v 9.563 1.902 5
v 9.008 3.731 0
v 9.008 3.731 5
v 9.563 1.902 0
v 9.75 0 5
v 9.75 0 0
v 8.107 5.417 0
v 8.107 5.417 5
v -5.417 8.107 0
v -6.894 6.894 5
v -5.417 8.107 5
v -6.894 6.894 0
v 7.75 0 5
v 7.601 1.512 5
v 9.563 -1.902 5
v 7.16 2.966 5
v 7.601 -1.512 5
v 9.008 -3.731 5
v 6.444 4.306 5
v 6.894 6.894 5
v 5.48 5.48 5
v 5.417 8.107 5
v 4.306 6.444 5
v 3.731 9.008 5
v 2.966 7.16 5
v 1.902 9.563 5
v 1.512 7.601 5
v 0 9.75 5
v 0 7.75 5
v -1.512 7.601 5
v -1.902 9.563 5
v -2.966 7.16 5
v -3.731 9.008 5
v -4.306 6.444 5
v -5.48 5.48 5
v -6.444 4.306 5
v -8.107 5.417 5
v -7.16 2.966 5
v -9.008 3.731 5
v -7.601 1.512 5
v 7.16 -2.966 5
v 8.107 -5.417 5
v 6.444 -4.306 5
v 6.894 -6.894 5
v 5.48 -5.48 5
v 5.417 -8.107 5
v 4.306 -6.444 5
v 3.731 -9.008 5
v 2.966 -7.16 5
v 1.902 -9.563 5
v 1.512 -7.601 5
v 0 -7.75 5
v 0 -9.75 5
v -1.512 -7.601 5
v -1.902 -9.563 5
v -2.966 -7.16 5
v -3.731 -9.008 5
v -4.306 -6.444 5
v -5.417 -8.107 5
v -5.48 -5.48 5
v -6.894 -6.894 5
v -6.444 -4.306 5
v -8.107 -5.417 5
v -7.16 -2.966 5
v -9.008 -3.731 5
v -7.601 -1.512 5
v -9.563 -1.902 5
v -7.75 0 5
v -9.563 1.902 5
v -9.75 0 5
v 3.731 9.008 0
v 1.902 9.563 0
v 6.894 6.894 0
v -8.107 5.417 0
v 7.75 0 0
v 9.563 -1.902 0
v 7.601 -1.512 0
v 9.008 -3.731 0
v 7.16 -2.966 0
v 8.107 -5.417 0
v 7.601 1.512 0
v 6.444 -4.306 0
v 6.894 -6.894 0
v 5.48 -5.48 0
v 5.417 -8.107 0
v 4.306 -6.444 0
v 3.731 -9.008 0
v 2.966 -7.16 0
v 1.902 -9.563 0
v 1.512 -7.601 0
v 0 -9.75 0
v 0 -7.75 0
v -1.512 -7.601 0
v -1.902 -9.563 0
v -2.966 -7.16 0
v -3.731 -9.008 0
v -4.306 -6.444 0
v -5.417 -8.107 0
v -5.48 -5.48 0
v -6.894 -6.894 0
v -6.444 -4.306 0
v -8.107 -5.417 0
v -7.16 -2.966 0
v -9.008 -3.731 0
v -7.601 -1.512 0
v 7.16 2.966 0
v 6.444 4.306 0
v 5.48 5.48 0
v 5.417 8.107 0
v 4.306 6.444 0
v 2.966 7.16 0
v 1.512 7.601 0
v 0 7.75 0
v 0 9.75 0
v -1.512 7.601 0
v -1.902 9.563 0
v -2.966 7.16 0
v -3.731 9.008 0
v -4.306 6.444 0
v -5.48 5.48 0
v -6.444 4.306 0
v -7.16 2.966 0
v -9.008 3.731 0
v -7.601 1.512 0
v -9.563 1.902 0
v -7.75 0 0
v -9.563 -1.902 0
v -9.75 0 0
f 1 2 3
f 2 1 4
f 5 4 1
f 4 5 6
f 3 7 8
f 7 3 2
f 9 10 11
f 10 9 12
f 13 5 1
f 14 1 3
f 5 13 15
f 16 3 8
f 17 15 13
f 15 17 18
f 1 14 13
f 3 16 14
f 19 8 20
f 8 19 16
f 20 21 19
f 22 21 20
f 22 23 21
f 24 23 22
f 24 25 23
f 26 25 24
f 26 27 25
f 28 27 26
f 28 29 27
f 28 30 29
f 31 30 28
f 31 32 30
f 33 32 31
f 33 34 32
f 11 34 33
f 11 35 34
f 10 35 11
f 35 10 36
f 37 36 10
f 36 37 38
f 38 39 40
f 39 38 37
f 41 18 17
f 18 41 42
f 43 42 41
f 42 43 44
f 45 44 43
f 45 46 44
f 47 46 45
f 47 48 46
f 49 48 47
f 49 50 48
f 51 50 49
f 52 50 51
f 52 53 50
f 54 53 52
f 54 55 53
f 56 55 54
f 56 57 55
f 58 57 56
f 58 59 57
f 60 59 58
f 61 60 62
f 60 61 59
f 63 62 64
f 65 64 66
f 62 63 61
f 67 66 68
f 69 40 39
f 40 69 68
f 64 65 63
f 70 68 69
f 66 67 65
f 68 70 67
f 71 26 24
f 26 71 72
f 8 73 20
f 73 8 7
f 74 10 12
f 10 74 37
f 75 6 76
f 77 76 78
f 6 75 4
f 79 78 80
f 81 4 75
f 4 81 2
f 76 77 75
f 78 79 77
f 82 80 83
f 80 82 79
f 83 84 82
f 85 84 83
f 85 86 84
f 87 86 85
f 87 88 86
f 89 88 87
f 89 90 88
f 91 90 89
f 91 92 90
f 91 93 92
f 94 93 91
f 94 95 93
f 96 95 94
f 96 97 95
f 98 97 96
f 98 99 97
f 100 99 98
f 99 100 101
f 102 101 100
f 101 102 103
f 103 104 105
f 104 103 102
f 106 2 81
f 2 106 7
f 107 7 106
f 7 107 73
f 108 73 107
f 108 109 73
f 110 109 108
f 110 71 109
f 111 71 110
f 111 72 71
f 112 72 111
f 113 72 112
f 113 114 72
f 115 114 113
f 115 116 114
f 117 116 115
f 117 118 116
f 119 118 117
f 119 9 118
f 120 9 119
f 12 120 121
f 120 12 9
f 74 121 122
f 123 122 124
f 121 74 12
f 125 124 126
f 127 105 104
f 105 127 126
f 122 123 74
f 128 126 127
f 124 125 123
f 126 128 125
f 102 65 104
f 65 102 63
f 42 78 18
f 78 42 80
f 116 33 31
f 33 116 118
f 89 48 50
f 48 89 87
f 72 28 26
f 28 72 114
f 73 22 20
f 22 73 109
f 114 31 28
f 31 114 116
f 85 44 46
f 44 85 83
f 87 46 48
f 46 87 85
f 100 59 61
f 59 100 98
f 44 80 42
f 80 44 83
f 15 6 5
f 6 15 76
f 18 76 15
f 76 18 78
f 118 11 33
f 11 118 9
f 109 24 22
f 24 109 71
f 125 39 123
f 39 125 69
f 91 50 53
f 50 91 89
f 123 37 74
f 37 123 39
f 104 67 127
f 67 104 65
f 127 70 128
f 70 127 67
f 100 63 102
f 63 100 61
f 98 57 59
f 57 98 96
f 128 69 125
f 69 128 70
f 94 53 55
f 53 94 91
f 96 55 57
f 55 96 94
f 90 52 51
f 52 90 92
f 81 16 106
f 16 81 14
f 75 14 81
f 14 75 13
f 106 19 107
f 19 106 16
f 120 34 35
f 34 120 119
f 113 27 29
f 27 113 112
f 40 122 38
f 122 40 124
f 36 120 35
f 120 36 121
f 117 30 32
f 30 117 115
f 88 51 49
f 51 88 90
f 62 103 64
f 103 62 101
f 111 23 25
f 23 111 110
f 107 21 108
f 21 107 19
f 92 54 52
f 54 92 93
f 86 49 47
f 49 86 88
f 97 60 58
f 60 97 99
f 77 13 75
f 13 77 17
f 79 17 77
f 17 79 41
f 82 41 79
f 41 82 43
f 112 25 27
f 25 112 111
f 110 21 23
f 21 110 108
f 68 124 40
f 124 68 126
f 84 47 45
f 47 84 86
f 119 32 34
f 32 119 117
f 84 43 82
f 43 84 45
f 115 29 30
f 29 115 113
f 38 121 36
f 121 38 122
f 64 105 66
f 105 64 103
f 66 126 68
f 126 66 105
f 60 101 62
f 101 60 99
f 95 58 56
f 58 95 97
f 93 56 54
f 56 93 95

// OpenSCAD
$fn = 32;

// ----------------------------------------------------------------------
// Spacer sleeve: 19.5 / 15.5 x 5 mm
// ----------------------------------------------------------------------

// --- parameters (mm) ---
sleeve_od = 19.5;         // outside diameter
sleeve_id = 15.5;         // shaft bore
sleeve_l = 5;             // sleeve length

module sleeve() {
  cylinder(h = sleeve_l, d = sleeve_od);
}

difference() {
  sleeve();
  translate([0, 0, -1]) cylinder(h = sleeve_l + 2, d = sleeve_id);
}
